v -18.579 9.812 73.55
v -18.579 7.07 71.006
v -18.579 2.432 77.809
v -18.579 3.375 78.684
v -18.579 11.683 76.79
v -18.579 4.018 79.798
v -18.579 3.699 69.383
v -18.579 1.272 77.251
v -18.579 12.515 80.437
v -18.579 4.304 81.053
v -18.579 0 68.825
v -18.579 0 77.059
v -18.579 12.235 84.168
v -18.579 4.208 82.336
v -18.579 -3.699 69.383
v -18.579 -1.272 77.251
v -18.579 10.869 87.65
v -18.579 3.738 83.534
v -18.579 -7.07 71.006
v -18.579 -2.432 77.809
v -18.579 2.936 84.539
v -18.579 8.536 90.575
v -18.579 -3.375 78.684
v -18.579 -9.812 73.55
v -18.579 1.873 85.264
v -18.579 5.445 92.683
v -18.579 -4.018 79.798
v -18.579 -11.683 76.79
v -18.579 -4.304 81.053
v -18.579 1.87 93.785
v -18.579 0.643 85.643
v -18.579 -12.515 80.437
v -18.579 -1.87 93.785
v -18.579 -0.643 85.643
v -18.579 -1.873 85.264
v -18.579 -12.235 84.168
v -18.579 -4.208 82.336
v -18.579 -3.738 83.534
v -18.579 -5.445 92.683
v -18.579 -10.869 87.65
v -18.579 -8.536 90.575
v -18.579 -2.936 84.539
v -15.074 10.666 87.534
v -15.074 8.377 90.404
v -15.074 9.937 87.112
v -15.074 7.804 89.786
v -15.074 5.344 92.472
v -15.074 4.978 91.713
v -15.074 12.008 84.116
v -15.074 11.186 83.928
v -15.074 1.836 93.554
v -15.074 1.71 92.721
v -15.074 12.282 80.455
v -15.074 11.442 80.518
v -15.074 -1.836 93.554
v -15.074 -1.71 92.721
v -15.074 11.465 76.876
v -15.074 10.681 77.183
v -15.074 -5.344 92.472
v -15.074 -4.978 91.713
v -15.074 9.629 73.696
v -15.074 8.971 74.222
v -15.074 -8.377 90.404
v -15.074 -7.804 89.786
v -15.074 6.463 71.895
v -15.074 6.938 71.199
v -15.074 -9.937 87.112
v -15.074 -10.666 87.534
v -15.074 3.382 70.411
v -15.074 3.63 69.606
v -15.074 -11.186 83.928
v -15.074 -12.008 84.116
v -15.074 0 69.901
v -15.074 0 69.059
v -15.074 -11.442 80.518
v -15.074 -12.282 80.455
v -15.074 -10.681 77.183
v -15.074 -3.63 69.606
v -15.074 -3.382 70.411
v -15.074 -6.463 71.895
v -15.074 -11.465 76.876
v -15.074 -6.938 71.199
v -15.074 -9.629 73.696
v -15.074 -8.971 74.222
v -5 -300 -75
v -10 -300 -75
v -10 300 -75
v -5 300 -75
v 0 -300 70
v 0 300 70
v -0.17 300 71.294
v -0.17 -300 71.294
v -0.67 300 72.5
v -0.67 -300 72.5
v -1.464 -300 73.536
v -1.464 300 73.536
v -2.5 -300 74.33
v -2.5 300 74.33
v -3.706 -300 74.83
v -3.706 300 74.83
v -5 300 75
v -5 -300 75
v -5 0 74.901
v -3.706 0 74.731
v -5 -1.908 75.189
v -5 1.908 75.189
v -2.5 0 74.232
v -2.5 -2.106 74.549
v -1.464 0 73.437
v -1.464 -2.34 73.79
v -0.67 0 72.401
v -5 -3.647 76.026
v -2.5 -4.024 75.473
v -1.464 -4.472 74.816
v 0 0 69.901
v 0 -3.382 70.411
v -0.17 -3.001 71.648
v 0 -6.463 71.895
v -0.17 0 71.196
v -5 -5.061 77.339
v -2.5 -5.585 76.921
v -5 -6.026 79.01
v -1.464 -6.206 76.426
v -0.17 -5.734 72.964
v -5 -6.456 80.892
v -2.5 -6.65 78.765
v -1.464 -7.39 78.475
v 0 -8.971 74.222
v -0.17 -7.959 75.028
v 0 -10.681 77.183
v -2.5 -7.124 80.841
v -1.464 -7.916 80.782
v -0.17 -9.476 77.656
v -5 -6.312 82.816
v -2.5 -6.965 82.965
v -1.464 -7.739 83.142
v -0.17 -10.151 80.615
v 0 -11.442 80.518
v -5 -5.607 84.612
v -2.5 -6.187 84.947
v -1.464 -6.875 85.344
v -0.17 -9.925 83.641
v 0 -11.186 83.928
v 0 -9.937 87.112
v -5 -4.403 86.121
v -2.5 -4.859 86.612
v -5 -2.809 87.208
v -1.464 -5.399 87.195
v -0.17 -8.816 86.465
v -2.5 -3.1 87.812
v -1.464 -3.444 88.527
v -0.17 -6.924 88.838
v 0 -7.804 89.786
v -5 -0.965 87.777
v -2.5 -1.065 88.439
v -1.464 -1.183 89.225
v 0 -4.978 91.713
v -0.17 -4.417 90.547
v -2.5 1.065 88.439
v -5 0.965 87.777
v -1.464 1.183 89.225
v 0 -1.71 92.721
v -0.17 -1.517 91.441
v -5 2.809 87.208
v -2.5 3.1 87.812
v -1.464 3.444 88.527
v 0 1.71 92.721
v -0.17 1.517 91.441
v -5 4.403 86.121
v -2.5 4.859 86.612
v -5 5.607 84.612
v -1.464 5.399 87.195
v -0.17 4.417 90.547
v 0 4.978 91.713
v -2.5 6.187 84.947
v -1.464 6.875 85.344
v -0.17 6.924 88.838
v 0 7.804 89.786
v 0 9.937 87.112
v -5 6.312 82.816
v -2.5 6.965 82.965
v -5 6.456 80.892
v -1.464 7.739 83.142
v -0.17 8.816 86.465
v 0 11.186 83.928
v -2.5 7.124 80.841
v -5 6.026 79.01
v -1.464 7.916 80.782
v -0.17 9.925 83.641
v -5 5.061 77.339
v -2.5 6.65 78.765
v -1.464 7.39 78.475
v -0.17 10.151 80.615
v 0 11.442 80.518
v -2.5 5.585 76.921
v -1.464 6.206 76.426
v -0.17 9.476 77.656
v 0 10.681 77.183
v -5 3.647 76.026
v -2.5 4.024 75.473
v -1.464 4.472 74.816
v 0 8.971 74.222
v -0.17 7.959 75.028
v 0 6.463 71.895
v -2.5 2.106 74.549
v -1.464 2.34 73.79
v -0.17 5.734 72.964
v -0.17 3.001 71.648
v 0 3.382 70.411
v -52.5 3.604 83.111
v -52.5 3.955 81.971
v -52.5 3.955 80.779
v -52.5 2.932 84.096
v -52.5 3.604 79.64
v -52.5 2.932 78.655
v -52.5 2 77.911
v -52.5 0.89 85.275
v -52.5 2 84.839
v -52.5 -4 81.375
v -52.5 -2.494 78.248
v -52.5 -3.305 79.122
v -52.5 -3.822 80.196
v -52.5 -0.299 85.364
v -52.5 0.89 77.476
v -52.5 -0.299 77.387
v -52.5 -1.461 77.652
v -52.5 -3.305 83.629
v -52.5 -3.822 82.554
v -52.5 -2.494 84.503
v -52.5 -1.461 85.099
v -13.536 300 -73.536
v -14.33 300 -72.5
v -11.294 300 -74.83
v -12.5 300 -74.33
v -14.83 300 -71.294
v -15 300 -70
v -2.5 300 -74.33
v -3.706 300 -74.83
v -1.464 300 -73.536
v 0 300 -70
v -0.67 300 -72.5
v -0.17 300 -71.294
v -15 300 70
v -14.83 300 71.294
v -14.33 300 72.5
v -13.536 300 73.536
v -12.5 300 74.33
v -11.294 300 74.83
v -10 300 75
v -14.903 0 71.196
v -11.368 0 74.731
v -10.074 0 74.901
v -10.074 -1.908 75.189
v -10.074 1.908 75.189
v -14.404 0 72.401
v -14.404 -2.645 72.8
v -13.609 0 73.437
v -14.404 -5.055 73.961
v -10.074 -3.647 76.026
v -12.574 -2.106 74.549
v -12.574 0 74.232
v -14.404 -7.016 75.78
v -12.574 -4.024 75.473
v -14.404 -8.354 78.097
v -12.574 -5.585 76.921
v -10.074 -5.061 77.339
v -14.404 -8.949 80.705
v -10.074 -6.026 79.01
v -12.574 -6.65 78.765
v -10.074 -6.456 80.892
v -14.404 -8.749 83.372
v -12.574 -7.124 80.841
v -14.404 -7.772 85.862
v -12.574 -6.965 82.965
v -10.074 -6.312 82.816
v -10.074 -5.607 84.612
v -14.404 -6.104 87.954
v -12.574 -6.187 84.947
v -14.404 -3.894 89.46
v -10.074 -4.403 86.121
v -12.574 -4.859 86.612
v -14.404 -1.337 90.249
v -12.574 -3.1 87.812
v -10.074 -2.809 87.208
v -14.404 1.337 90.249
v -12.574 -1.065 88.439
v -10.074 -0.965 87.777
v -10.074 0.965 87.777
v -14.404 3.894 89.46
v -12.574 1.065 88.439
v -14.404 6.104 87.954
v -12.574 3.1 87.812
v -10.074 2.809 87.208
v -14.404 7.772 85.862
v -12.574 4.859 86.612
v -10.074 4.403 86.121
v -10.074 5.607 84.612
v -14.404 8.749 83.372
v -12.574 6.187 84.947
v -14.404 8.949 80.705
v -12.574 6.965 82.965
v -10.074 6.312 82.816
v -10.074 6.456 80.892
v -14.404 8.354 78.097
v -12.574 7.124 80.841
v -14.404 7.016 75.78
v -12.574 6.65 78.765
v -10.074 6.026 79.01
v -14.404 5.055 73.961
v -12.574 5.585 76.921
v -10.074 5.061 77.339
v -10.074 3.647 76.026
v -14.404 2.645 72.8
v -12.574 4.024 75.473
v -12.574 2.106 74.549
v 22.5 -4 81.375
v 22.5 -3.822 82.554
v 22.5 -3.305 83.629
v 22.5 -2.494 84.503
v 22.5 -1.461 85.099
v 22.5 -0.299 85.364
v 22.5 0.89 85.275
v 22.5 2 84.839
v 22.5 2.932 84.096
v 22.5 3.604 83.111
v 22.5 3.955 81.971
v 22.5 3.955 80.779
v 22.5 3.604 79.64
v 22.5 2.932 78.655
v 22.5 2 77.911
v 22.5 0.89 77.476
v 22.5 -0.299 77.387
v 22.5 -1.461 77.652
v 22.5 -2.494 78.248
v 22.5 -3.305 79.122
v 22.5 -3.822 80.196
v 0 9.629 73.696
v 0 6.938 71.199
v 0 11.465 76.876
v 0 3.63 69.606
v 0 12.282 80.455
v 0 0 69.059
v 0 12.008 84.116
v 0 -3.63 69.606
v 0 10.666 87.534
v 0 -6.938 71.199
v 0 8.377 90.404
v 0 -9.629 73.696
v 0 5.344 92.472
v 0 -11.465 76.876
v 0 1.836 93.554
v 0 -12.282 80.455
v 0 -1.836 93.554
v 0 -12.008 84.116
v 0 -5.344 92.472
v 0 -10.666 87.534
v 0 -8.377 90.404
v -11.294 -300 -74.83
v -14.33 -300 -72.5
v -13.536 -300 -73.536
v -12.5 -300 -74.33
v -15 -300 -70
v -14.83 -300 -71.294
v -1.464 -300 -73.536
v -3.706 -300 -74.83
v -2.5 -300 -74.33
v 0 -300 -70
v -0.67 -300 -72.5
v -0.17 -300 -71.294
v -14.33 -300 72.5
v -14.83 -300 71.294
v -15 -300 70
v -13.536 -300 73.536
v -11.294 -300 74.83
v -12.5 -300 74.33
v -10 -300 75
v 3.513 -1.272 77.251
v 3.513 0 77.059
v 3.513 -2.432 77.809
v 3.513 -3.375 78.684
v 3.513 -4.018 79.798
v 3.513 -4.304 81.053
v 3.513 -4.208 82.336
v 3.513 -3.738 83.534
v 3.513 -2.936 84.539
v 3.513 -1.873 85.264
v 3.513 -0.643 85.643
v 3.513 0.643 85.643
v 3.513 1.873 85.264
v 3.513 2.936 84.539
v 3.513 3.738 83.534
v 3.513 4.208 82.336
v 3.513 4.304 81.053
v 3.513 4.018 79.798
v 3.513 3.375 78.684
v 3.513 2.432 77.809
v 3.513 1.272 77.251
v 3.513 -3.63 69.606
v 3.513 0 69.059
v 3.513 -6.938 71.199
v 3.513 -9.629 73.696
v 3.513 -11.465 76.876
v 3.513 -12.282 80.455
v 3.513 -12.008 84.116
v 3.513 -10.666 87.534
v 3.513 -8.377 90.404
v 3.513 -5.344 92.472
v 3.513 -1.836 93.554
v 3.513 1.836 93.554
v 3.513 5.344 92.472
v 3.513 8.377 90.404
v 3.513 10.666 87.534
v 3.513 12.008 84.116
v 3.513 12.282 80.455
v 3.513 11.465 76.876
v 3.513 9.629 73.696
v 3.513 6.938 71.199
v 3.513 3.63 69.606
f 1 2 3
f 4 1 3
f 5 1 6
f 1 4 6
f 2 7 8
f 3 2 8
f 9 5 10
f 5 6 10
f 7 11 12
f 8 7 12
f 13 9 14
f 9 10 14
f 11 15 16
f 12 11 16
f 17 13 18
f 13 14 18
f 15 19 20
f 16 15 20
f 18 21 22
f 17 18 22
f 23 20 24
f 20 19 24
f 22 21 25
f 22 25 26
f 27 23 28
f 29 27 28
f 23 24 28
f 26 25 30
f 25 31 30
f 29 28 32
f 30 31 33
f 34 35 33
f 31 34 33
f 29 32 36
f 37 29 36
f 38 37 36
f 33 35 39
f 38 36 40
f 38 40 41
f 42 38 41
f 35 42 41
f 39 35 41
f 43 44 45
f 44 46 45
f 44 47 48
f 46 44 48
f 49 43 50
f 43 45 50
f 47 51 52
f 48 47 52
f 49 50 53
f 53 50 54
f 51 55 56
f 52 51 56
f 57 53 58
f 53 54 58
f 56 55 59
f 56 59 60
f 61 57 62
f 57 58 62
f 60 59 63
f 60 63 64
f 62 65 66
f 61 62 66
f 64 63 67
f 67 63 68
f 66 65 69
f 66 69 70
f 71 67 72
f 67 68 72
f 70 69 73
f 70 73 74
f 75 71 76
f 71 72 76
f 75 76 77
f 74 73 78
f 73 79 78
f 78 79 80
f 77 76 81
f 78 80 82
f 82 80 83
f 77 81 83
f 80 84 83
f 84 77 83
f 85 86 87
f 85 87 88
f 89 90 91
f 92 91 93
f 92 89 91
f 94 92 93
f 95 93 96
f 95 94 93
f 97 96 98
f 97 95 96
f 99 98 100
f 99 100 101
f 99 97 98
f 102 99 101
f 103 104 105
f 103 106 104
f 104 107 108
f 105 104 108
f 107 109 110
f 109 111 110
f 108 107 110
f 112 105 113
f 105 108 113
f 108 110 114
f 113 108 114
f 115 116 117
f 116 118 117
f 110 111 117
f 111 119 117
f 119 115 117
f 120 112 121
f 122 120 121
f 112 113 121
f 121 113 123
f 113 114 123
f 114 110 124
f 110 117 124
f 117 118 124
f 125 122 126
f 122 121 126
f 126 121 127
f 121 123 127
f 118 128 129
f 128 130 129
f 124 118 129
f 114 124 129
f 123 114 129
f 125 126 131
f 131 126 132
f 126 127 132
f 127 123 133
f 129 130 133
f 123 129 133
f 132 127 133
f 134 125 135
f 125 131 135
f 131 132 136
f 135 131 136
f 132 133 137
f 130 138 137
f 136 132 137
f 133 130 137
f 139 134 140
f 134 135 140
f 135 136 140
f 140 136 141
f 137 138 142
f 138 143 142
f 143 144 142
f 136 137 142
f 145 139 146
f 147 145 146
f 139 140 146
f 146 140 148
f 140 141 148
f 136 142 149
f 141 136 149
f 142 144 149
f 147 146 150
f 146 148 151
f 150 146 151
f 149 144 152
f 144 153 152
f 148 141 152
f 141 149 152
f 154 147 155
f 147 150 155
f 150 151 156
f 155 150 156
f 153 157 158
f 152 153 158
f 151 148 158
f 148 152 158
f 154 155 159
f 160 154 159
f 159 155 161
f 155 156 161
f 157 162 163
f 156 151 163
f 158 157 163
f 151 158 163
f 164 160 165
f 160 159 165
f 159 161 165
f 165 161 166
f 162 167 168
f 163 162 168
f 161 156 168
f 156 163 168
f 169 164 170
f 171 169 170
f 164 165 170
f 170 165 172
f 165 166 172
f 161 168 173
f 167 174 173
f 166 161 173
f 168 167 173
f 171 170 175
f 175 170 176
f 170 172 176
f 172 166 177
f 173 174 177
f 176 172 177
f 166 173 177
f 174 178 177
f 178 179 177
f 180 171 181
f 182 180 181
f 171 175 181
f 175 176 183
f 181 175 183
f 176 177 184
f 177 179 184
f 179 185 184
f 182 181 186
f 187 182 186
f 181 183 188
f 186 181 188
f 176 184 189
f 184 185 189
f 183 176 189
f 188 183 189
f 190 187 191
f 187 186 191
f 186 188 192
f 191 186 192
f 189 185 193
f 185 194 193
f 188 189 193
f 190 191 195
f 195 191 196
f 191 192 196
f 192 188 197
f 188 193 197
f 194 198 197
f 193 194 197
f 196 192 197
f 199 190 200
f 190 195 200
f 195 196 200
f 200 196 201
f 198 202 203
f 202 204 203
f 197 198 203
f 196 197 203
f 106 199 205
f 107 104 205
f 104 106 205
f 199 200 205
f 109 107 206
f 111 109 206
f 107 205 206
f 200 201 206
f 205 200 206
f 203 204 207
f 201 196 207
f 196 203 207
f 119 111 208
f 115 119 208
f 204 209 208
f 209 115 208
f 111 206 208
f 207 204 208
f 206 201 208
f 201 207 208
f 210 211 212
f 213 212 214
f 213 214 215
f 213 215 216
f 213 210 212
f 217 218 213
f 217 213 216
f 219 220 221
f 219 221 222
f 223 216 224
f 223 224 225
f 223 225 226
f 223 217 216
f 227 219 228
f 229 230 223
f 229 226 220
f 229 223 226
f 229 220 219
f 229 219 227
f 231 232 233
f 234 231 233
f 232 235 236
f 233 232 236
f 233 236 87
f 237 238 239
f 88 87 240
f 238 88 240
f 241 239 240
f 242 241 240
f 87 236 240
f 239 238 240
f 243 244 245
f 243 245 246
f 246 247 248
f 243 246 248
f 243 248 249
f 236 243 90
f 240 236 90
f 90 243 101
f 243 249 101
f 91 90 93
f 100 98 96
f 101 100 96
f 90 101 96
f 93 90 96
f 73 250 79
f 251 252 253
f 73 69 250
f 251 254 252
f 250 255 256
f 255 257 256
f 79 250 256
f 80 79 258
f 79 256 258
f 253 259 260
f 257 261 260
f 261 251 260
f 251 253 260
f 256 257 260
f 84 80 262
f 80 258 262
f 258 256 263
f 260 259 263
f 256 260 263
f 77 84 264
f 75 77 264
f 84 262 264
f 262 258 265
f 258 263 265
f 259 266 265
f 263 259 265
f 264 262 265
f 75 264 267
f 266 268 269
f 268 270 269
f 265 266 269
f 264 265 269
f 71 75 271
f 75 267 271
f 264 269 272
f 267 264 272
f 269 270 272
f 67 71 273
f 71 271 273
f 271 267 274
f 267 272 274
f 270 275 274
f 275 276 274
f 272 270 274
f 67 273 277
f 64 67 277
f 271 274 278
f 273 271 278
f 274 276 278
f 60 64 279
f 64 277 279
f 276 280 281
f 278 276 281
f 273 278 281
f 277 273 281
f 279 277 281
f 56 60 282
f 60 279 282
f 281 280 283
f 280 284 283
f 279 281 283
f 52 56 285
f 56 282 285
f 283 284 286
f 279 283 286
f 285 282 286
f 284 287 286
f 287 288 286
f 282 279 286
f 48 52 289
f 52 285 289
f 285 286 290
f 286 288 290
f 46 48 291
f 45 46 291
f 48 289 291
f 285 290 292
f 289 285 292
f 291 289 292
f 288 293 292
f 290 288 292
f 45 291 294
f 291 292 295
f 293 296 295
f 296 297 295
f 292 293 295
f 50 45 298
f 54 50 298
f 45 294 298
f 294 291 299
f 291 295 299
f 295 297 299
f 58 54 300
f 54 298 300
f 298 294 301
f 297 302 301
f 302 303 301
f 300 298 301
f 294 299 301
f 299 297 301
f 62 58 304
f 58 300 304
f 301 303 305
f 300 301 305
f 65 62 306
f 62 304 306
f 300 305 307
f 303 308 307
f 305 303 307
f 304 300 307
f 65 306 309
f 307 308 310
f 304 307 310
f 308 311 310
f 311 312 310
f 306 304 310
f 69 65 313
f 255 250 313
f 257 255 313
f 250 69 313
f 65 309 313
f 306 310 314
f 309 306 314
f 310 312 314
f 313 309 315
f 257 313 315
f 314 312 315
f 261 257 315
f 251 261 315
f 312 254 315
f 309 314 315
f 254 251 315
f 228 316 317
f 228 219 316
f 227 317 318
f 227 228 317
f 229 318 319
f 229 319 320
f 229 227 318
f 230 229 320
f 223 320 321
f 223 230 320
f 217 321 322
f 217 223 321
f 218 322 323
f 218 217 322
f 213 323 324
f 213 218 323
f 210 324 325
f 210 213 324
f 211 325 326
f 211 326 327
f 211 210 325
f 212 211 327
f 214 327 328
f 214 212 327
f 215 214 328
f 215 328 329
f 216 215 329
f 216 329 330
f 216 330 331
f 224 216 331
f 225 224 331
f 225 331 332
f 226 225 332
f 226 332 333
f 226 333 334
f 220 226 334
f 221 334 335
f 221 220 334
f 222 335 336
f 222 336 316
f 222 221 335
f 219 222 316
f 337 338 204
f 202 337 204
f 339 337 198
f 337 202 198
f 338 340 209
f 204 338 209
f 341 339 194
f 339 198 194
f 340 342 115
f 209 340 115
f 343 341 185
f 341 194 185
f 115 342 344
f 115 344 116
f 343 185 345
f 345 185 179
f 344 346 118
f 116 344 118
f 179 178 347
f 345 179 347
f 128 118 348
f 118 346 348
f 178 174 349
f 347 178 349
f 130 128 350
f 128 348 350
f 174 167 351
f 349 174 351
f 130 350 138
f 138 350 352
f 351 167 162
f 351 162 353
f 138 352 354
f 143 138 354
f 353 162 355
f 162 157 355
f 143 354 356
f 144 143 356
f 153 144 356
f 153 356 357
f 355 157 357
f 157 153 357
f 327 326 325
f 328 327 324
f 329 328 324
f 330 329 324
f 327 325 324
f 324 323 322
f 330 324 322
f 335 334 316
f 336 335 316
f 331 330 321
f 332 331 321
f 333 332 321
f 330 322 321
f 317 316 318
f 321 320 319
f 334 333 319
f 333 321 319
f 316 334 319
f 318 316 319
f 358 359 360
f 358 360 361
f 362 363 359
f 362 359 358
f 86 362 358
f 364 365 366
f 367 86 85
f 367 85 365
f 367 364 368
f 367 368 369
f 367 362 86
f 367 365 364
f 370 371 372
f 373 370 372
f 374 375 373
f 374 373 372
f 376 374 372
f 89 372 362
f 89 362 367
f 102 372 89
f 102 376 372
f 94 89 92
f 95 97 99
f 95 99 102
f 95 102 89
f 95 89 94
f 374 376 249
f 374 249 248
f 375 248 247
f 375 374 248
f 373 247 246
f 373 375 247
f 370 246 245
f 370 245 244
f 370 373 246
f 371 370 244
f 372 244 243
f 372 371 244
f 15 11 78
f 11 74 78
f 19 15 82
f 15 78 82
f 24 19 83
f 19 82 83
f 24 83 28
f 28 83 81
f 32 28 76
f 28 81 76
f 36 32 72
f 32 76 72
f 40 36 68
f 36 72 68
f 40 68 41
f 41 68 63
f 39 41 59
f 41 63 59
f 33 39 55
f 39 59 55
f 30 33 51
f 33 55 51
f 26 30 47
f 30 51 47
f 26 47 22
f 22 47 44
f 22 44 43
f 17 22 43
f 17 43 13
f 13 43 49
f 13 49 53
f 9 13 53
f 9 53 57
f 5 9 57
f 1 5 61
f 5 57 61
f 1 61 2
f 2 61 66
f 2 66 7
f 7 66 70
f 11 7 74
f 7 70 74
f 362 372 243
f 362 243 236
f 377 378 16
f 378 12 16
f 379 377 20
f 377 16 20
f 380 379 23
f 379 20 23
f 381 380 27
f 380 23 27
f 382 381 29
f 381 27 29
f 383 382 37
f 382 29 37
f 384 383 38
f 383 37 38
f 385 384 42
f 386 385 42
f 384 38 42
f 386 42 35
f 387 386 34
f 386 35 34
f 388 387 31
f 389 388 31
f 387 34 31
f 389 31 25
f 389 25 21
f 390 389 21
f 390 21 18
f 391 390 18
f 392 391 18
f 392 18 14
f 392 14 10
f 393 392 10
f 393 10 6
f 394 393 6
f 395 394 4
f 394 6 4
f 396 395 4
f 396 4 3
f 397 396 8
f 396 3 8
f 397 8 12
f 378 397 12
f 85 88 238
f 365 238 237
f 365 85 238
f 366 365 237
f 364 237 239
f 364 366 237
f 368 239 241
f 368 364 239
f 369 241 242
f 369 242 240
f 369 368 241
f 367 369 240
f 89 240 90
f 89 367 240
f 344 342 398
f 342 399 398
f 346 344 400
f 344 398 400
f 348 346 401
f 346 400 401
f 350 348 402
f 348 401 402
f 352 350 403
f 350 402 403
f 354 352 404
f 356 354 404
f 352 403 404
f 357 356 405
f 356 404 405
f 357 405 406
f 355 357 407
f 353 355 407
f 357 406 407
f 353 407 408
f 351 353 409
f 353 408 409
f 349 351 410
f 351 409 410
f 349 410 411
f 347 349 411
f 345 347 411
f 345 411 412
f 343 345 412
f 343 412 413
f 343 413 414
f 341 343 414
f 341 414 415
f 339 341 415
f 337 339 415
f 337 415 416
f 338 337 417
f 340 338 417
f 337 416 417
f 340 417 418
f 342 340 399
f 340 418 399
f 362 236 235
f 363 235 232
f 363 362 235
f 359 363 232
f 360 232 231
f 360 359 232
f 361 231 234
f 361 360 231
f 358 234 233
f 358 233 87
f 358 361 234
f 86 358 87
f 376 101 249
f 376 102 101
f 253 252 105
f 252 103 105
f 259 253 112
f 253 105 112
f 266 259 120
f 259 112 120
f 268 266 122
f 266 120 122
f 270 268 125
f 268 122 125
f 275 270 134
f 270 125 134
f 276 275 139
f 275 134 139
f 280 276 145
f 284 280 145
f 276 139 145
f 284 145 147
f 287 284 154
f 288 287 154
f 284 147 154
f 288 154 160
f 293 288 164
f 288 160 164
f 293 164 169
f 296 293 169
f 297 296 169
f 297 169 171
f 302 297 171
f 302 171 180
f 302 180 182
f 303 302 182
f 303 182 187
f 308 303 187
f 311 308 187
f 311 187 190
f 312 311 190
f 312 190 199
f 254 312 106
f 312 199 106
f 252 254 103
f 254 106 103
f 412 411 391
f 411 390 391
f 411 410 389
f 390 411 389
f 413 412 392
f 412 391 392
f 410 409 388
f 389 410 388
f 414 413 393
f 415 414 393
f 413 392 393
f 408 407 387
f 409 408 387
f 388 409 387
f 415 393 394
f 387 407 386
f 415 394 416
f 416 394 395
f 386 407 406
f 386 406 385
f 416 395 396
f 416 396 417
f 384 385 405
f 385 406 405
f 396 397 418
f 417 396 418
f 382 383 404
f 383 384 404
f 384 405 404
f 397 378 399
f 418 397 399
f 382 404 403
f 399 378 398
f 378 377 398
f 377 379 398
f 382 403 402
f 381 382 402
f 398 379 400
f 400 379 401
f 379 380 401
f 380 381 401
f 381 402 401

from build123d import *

# Parameters (mm, degrees)
F1_DEPTH = 300
F2_R     = 4
F3_DEPTH = 37.5


with BuildPart() as f1:
    # F0 (on Front) → F1 (new body, symmetric)
    with BuildSketch(Plane.XZ):
        with BuildLine():
            Line((-5, 75), (-10, 75))
            ThreePointArc((-10, 75), (-13.535534, 73.535534), (-15, 70))
            Line((-15, 70), (-15, -70))
            ThreePointArc((-15, -70), (-13.535534, -73.535534), (-10, -75))
            Line((-10, -75), (-5, -75))
            ThreePointArc((-5, -75), (-1.464466, -73.535534), (0, -70))
            Line((0, -70), (0, 70))
            ThreePointArc((0, 70), (-1.464466, 73.535534), (-5, 75))
        make_face()
    extrude(amount=F1_DEPTH, both=True)


with BuildPart() as f3:
    # F2 (on face) → F3 (new body, symmetric)
    with BuildSketch(Plane(origin=(-15, 0, 0), x_dir=(0, -1, 0), z_dir=(-1, 0, 0))):
        with Locations((0, 81.375323)):
            Circle(F2_R)
    extrude(amount=F3_DEPTH, both=True)


with BuildPart() as f5:
    # F4 (on Front) → F5 (revolve)
    with BuildSketch(Plane.XZ):
        with BuildLine():
            Line((-18.57931, 77.05894), (-18.57931, 68.825245))
            Line((-18.57931, 68.825245), (-15.07378, 69.05894))
            Line((-15.07378, 69.05894), (-15.07378, 69.901491))
            ThreePointArc((-15.07378, 69.901491), (-13.609314, 73.437025), (-10.07378, 74.901491))
            Line((-10.07378, 74.901491), (-5, 74.901491))
            ThreePointArc((-5, 74.901491), (-1.464466, 73.437025), (0, 69.901491))
            Line((0, 69.901491), (0, 69.05894))
            Line((0, 69.05894), (3.513311, 69.05894))
            Line((3.513311, 69.05894), (3.513311, 77.05894))
            Line((3.513311, 77.05894), (-18.57931, 77.05894))
        make_face()
    revolve(axis=Axis((-15, 0, 81.375323), (-1, 0, 0)))


solid = Compound([f1.part, f3.part, f5.part])
